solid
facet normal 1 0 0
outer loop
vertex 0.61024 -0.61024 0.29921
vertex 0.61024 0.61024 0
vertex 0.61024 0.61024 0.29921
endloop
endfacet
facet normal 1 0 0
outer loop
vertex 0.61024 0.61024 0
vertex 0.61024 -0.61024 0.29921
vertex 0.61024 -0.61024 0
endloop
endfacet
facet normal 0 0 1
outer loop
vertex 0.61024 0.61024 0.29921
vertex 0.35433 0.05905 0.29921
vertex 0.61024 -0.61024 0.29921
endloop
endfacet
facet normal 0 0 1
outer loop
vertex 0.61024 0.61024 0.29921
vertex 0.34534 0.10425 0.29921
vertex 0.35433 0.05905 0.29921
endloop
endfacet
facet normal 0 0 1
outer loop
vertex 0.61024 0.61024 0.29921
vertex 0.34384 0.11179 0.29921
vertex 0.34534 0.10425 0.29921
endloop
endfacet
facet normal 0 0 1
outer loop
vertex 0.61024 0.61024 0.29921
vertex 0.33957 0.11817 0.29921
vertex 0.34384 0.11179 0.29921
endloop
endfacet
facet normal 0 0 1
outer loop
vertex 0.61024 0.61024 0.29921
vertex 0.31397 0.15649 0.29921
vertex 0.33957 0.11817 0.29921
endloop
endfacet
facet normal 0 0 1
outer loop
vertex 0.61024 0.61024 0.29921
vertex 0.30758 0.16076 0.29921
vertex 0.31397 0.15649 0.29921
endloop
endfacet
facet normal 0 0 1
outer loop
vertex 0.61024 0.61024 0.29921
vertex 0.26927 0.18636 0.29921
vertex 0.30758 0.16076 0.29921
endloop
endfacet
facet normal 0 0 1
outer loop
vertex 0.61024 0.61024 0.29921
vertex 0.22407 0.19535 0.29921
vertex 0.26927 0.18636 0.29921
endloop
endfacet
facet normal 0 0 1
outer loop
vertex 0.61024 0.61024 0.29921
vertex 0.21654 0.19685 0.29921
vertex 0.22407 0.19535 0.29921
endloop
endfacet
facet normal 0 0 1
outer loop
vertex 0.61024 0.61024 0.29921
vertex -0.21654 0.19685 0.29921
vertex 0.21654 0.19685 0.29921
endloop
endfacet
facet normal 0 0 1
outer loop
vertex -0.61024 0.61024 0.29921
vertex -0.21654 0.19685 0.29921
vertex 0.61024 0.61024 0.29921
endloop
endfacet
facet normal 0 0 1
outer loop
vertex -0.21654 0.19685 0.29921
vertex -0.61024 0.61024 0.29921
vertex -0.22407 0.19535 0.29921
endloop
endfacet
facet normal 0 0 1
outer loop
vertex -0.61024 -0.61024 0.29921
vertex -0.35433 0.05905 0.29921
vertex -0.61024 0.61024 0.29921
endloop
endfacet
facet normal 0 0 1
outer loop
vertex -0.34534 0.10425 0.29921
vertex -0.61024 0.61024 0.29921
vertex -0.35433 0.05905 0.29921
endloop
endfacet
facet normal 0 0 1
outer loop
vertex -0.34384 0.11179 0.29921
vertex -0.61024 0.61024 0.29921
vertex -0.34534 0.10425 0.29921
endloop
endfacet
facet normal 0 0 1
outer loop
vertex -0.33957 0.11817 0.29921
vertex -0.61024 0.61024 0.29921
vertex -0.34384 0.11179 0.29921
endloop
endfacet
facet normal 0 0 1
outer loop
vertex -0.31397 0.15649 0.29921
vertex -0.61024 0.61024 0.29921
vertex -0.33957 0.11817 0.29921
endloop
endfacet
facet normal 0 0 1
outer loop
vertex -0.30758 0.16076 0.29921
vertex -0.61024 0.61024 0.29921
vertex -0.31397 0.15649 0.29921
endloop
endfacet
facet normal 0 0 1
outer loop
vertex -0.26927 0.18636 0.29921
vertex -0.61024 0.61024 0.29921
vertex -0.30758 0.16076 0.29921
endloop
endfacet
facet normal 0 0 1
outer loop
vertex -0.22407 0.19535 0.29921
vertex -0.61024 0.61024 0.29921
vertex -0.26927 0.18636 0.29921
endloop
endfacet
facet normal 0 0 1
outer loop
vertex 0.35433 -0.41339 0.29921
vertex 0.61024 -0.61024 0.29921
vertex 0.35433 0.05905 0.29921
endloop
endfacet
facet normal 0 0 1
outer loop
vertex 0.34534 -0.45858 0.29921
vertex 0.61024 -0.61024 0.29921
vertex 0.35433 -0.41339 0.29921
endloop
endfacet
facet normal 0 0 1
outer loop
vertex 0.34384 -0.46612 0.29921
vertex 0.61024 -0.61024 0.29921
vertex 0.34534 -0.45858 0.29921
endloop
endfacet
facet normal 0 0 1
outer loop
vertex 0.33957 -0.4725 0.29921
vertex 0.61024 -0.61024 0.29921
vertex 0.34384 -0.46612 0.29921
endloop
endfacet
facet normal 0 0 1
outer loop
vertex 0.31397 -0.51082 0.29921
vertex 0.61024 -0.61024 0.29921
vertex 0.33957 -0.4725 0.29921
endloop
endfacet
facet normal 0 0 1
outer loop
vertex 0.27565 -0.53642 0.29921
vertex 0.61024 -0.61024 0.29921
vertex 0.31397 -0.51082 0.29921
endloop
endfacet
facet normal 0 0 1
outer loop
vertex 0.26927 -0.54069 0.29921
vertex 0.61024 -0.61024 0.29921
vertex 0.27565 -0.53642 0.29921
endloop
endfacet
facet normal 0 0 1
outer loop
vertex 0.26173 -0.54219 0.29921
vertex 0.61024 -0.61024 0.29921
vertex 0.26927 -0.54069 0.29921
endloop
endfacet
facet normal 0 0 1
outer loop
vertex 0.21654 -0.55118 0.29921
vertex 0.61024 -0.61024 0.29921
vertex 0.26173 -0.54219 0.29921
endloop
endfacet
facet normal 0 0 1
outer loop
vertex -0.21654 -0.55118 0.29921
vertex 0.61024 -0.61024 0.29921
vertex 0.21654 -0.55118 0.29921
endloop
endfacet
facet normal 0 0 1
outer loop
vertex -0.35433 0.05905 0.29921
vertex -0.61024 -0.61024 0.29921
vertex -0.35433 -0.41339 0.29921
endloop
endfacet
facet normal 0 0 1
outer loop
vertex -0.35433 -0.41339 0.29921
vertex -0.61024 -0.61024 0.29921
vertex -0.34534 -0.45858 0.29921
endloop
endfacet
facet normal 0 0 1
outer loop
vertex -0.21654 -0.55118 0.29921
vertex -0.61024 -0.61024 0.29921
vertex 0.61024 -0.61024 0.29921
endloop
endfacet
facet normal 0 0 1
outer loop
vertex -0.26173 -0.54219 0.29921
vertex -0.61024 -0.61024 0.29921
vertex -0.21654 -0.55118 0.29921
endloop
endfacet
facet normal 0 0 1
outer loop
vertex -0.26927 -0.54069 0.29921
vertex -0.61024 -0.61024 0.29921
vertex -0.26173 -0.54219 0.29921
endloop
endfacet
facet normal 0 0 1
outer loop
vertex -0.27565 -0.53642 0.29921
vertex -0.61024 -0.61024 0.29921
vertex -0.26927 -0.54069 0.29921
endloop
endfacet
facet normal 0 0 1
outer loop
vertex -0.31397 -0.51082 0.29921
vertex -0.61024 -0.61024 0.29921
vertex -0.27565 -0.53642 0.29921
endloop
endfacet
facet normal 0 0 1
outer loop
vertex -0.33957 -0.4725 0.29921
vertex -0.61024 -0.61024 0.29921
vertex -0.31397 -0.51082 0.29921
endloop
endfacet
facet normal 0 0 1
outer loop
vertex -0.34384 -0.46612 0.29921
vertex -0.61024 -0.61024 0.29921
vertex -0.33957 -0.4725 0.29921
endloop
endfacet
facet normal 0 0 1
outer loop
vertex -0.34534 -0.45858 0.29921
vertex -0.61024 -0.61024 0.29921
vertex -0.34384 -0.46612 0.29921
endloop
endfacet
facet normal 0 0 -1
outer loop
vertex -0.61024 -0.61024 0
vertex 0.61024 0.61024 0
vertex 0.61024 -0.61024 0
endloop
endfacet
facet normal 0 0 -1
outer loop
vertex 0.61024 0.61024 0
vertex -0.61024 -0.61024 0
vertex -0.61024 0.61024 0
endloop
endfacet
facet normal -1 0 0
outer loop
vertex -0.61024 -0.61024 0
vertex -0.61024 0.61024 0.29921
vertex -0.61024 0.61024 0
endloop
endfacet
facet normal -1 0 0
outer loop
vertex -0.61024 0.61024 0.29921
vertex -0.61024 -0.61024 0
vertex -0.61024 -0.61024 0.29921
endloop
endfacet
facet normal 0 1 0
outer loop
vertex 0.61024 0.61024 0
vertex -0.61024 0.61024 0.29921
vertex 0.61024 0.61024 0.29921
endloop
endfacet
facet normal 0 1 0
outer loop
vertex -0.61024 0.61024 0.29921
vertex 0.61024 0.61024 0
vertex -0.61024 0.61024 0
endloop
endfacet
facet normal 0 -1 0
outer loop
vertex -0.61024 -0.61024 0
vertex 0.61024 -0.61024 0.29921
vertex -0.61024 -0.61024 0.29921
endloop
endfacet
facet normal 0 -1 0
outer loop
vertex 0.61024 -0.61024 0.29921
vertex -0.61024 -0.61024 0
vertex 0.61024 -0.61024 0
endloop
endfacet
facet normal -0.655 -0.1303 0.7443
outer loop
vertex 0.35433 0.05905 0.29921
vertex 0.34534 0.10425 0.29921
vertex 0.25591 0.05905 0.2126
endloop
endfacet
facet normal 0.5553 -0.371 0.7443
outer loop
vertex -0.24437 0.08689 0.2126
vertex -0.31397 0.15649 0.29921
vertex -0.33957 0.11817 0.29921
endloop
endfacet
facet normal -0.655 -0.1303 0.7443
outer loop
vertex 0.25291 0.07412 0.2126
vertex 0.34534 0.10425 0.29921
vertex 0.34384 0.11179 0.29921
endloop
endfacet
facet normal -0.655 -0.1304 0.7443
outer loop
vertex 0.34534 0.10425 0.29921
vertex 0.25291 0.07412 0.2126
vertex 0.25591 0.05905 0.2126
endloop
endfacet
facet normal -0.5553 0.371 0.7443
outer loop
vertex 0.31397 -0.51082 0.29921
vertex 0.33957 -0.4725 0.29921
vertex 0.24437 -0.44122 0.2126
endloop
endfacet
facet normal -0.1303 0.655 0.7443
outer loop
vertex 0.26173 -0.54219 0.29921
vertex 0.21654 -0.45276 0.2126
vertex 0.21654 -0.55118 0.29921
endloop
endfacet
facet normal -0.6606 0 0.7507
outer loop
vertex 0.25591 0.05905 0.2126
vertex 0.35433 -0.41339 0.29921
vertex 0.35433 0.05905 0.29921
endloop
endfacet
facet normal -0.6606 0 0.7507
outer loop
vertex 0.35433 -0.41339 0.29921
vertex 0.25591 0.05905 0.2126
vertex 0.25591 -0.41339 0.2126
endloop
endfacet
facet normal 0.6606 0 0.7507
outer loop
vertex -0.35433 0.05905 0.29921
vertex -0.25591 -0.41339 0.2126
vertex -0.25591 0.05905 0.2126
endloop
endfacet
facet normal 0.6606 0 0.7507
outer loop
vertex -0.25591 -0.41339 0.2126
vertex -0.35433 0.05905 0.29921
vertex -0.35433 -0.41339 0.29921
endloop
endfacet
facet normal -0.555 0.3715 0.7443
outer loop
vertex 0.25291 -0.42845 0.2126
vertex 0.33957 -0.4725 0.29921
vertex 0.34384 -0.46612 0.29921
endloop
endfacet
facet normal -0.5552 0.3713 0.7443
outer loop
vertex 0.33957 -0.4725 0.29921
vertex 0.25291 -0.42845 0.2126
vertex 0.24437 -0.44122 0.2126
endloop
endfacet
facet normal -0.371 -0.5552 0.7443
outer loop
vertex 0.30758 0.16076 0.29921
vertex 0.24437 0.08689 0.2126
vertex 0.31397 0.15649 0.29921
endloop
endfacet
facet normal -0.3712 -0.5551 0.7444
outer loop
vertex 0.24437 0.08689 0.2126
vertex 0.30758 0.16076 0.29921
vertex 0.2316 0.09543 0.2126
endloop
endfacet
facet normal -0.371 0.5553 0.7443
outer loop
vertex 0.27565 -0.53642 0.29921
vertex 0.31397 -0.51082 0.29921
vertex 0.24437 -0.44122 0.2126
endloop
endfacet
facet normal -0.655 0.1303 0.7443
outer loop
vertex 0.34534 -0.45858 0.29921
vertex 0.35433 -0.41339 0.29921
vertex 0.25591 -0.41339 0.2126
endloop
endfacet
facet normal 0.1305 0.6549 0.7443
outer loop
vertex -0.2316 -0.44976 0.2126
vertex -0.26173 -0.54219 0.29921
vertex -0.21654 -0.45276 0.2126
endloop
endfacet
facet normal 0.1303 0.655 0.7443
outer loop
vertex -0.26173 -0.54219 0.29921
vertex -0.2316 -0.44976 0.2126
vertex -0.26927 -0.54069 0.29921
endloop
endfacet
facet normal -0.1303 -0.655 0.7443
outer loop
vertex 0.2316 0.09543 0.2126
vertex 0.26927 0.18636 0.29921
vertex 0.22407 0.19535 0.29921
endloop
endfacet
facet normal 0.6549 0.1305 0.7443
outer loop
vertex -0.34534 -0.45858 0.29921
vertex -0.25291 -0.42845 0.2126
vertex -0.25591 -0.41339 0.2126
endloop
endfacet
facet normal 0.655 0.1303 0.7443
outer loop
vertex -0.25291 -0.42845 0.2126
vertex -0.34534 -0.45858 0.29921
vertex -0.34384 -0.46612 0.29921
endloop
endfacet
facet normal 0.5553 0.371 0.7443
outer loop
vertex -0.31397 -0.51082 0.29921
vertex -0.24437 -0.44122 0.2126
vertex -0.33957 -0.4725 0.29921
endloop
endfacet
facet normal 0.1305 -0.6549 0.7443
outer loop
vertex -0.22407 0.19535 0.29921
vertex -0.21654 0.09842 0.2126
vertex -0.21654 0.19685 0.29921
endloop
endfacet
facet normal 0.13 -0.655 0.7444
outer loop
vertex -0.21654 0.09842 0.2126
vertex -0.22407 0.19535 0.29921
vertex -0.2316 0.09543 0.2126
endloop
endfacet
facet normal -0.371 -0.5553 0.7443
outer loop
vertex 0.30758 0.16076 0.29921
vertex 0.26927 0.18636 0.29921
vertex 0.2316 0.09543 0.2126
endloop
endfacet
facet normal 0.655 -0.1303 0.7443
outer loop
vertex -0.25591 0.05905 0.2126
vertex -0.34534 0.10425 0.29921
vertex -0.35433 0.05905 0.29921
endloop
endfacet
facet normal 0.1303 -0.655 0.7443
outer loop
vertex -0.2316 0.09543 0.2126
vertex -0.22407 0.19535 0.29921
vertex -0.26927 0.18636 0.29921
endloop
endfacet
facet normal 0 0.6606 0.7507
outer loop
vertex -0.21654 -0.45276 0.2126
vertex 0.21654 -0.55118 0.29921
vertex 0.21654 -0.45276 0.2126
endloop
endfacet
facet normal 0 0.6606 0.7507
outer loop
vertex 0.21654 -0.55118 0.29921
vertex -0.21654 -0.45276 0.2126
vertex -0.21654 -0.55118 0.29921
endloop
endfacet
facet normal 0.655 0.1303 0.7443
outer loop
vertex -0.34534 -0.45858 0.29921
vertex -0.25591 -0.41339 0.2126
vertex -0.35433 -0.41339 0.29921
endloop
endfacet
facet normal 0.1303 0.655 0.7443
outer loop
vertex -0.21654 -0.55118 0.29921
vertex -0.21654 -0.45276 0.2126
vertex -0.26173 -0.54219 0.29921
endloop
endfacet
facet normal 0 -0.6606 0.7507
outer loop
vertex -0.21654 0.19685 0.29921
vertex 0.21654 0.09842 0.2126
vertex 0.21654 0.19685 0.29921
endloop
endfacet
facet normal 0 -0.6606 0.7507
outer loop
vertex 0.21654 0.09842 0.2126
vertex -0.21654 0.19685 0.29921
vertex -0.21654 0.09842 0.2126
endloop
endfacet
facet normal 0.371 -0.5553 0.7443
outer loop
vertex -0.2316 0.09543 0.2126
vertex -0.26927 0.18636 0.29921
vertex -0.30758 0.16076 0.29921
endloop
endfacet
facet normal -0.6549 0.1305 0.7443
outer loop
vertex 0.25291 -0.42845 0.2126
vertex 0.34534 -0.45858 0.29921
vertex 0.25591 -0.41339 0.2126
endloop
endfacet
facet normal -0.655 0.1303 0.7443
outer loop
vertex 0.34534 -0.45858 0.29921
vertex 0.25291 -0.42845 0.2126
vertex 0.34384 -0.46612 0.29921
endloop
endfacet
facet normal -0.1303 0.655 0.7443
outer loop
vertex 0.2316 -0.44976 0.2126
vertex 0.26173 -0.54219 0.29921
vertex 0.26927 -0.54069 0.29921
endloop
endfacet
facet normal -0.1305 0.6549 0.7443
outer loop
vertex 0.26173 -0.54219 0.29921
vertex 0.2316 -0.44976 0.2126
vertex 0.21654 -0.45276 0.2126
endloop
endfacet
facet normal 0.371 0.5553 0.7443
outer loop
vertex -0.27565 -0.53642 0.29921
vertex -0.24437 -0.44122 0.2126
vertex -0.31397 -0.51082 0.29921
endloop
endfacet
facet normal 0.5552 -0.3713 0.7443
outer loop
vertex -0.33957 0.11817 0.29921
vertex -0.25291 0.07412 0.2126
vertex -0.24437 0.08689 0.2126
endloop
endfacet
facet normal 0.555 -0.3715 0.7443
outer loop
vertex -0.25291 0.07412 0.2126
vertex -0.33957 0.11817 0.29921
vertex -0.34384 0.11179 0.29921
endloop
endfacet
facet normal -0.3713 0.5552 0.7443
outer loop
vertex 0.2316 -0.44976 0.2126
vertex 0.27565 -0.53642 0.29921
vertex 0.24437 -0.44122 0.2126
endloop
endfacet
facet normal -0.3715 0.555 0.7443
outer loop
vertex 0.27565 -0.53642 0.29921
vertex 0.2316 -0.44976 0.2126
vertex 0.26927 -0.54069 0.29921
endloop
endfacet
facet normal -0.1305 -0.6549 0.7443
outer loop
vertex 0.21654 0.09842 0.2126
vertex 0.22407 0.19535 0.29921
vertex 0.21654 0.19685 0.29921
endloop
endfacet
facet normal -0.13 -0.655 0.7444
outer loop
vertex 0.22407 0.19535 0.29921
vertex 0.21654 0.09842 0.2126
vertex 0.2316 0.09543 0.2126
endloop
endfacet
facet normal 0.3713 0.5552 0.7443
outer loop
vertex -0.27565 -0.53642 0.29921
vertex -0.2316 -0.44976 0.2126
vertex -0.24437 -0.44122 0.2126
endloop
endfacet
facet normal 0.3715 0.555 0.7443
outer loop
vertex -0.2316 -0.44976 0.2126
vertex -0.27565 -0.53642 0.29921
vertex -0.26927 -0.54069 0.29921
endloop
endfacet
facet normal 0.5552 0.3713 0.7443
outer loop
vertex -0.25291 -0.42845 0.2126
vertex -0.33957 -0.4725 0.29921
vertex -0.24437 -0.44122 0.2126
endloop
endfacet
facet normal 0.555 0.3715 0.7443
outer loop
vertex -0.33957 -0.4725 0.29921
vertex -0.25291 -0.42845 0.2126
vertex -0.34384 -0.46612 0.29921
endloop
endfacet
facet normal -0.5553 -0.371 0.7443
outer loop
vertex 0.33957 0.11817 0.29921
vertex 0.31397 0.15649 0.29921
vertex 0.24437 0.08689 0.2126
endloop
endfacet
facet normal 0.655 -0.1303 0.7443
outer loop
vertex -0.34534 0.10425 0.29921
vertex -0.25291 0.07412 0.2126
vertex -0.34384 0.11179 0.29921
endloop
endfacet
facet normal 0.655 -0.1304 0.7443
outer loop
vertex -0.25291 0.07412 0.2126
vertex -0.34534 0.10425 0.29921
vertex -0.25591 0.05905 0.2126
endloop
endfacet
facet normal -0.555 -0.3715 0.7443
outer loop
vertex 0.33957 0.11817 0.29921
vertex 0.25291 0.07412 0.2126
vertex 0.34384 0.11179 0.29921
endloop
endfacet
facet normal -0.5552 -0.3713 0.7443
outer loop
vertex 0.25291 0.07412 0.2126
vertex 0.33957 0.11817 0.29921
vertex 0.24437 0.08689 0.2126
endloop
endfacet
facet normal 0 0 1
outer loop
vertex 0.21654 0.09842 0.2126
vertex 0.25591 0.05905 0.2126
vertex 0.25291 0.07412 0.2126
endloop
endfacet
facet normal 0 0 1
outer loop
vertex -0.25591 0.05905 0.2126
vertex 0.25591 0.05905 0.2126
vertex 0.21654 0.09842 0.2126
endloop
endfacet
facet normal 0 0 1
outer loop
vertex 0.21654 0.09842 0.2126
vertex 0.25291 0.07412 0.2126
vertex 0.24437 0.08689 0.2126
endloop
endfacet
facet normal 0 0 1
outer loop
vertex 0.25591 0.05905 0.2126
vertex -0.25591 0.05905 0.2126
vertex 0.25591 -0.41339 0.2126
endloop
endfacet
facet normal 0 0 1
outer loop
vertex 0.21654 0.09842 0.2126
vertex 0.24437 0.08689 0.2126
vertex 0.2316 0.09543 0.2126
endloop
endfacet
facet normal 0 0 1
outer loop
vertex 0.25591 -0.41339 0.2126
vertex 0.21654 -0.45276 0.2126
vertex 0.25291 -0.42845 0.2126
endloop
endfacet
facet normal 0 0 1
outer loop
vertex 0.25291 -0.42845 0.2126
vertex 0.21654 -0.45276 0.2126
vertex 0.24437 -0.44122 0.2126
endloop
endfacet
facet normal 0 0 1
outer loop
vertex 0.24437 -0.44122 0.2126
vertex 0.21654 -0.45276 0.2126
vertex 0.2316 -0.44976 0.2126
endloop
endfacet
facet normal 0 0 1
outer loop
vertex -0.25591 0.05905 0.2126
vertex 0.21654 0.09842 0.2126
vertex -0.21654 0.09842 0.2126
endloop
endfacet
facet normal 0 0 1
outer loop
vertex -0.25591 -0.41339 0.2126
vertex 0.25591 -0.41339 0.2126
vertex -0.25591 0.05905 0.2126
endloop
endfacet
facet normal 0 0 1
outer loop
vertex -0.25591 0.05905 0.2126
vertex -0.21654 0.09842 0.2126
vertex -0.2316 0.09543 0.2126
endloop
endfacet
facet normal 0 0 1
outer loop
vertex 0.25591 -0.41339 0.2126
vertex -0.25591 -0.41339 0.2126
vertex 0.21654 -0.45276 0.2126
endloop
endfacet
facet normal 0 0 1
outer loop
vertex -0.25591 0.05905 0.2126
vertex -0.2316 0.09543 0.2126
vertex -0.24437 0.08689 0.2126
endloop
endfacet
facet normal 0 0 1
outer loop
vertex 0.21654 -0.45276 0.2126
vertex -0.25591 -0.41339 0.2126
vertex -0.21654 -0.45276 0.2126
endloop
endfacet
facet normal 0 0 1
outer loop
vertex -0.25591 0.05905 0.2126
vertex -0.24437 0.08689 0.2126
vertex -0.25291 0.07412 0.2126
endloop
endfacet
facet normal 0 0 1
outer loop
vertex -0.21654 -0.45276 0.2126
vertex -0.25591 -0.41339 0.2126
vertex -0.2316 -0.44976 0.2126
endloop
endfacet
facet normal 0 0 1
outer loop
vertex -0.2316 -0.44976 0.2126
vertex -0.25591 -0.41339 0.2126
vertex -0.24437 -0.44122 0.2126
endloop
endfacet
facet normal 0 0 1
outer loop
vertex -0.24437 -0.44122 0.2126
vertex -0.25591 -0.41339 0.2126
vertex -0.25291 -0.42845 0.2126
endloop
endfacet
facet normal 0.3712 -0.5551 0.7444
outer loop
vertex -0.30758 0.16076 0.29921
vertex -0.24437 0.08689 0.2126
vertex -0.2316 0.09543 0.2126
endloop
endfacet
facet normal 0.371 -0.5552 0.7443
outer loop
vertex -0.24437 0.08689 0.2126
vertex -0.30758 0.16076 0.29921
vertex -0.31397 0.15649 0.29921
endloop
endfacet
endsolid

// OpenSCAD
// file: defines.scad
L = 3.1;  // Длина
W = 3.1;  // Ширина
H = 0.8;  // Высота (от платы, с выводами)
Hf = 0.04;  // Возвышение над платой (высота выводов)
e = 0.5;    // Шаг выводов

pin_fragments = 16;

scale = 1/2.54;
// main file
include <defines.scad>

ox = 1.1/2;
oy = 1.2/2;

scale(scale)
  color([0.15,0.15,0.15])
    translate([0, 0, (H - Hf)/2]) {
      difference() {
        cube([L, W, H - Hf], center = true);
        /*%translate([0.45, 0, (H - Hf)/2]) cube([1.2, 1.3, 0.44], center = true);*/
        translate([0.0,-0.45, (H - Hf)/2]) {
          hull(){
            translate([ ox, oy, 0]) cylinder(r1=0.1, r2=0.6, h=0.44, $fn=16, center=true);
            translate([-ox, oy, 0]) cylinder(r1=0.1, r2=0.6, h=0.44, $fn=16, center=true);
            translate([ ox,-oy, 0]) cylinder(r1=0.1, r2=0.6, h=0.44, $fn=16, center=true);
            translate([-ox,-oy, 0]) cylinder(r1=0.1, r2=0.6, h=0.44, $fn=16, center=true);
          }
        }
      }

        /*%translate([0.45, 0, (H - Hf)/2 - 0.44]) square(size=[1.2, 1.3], center=true);*/

    }
